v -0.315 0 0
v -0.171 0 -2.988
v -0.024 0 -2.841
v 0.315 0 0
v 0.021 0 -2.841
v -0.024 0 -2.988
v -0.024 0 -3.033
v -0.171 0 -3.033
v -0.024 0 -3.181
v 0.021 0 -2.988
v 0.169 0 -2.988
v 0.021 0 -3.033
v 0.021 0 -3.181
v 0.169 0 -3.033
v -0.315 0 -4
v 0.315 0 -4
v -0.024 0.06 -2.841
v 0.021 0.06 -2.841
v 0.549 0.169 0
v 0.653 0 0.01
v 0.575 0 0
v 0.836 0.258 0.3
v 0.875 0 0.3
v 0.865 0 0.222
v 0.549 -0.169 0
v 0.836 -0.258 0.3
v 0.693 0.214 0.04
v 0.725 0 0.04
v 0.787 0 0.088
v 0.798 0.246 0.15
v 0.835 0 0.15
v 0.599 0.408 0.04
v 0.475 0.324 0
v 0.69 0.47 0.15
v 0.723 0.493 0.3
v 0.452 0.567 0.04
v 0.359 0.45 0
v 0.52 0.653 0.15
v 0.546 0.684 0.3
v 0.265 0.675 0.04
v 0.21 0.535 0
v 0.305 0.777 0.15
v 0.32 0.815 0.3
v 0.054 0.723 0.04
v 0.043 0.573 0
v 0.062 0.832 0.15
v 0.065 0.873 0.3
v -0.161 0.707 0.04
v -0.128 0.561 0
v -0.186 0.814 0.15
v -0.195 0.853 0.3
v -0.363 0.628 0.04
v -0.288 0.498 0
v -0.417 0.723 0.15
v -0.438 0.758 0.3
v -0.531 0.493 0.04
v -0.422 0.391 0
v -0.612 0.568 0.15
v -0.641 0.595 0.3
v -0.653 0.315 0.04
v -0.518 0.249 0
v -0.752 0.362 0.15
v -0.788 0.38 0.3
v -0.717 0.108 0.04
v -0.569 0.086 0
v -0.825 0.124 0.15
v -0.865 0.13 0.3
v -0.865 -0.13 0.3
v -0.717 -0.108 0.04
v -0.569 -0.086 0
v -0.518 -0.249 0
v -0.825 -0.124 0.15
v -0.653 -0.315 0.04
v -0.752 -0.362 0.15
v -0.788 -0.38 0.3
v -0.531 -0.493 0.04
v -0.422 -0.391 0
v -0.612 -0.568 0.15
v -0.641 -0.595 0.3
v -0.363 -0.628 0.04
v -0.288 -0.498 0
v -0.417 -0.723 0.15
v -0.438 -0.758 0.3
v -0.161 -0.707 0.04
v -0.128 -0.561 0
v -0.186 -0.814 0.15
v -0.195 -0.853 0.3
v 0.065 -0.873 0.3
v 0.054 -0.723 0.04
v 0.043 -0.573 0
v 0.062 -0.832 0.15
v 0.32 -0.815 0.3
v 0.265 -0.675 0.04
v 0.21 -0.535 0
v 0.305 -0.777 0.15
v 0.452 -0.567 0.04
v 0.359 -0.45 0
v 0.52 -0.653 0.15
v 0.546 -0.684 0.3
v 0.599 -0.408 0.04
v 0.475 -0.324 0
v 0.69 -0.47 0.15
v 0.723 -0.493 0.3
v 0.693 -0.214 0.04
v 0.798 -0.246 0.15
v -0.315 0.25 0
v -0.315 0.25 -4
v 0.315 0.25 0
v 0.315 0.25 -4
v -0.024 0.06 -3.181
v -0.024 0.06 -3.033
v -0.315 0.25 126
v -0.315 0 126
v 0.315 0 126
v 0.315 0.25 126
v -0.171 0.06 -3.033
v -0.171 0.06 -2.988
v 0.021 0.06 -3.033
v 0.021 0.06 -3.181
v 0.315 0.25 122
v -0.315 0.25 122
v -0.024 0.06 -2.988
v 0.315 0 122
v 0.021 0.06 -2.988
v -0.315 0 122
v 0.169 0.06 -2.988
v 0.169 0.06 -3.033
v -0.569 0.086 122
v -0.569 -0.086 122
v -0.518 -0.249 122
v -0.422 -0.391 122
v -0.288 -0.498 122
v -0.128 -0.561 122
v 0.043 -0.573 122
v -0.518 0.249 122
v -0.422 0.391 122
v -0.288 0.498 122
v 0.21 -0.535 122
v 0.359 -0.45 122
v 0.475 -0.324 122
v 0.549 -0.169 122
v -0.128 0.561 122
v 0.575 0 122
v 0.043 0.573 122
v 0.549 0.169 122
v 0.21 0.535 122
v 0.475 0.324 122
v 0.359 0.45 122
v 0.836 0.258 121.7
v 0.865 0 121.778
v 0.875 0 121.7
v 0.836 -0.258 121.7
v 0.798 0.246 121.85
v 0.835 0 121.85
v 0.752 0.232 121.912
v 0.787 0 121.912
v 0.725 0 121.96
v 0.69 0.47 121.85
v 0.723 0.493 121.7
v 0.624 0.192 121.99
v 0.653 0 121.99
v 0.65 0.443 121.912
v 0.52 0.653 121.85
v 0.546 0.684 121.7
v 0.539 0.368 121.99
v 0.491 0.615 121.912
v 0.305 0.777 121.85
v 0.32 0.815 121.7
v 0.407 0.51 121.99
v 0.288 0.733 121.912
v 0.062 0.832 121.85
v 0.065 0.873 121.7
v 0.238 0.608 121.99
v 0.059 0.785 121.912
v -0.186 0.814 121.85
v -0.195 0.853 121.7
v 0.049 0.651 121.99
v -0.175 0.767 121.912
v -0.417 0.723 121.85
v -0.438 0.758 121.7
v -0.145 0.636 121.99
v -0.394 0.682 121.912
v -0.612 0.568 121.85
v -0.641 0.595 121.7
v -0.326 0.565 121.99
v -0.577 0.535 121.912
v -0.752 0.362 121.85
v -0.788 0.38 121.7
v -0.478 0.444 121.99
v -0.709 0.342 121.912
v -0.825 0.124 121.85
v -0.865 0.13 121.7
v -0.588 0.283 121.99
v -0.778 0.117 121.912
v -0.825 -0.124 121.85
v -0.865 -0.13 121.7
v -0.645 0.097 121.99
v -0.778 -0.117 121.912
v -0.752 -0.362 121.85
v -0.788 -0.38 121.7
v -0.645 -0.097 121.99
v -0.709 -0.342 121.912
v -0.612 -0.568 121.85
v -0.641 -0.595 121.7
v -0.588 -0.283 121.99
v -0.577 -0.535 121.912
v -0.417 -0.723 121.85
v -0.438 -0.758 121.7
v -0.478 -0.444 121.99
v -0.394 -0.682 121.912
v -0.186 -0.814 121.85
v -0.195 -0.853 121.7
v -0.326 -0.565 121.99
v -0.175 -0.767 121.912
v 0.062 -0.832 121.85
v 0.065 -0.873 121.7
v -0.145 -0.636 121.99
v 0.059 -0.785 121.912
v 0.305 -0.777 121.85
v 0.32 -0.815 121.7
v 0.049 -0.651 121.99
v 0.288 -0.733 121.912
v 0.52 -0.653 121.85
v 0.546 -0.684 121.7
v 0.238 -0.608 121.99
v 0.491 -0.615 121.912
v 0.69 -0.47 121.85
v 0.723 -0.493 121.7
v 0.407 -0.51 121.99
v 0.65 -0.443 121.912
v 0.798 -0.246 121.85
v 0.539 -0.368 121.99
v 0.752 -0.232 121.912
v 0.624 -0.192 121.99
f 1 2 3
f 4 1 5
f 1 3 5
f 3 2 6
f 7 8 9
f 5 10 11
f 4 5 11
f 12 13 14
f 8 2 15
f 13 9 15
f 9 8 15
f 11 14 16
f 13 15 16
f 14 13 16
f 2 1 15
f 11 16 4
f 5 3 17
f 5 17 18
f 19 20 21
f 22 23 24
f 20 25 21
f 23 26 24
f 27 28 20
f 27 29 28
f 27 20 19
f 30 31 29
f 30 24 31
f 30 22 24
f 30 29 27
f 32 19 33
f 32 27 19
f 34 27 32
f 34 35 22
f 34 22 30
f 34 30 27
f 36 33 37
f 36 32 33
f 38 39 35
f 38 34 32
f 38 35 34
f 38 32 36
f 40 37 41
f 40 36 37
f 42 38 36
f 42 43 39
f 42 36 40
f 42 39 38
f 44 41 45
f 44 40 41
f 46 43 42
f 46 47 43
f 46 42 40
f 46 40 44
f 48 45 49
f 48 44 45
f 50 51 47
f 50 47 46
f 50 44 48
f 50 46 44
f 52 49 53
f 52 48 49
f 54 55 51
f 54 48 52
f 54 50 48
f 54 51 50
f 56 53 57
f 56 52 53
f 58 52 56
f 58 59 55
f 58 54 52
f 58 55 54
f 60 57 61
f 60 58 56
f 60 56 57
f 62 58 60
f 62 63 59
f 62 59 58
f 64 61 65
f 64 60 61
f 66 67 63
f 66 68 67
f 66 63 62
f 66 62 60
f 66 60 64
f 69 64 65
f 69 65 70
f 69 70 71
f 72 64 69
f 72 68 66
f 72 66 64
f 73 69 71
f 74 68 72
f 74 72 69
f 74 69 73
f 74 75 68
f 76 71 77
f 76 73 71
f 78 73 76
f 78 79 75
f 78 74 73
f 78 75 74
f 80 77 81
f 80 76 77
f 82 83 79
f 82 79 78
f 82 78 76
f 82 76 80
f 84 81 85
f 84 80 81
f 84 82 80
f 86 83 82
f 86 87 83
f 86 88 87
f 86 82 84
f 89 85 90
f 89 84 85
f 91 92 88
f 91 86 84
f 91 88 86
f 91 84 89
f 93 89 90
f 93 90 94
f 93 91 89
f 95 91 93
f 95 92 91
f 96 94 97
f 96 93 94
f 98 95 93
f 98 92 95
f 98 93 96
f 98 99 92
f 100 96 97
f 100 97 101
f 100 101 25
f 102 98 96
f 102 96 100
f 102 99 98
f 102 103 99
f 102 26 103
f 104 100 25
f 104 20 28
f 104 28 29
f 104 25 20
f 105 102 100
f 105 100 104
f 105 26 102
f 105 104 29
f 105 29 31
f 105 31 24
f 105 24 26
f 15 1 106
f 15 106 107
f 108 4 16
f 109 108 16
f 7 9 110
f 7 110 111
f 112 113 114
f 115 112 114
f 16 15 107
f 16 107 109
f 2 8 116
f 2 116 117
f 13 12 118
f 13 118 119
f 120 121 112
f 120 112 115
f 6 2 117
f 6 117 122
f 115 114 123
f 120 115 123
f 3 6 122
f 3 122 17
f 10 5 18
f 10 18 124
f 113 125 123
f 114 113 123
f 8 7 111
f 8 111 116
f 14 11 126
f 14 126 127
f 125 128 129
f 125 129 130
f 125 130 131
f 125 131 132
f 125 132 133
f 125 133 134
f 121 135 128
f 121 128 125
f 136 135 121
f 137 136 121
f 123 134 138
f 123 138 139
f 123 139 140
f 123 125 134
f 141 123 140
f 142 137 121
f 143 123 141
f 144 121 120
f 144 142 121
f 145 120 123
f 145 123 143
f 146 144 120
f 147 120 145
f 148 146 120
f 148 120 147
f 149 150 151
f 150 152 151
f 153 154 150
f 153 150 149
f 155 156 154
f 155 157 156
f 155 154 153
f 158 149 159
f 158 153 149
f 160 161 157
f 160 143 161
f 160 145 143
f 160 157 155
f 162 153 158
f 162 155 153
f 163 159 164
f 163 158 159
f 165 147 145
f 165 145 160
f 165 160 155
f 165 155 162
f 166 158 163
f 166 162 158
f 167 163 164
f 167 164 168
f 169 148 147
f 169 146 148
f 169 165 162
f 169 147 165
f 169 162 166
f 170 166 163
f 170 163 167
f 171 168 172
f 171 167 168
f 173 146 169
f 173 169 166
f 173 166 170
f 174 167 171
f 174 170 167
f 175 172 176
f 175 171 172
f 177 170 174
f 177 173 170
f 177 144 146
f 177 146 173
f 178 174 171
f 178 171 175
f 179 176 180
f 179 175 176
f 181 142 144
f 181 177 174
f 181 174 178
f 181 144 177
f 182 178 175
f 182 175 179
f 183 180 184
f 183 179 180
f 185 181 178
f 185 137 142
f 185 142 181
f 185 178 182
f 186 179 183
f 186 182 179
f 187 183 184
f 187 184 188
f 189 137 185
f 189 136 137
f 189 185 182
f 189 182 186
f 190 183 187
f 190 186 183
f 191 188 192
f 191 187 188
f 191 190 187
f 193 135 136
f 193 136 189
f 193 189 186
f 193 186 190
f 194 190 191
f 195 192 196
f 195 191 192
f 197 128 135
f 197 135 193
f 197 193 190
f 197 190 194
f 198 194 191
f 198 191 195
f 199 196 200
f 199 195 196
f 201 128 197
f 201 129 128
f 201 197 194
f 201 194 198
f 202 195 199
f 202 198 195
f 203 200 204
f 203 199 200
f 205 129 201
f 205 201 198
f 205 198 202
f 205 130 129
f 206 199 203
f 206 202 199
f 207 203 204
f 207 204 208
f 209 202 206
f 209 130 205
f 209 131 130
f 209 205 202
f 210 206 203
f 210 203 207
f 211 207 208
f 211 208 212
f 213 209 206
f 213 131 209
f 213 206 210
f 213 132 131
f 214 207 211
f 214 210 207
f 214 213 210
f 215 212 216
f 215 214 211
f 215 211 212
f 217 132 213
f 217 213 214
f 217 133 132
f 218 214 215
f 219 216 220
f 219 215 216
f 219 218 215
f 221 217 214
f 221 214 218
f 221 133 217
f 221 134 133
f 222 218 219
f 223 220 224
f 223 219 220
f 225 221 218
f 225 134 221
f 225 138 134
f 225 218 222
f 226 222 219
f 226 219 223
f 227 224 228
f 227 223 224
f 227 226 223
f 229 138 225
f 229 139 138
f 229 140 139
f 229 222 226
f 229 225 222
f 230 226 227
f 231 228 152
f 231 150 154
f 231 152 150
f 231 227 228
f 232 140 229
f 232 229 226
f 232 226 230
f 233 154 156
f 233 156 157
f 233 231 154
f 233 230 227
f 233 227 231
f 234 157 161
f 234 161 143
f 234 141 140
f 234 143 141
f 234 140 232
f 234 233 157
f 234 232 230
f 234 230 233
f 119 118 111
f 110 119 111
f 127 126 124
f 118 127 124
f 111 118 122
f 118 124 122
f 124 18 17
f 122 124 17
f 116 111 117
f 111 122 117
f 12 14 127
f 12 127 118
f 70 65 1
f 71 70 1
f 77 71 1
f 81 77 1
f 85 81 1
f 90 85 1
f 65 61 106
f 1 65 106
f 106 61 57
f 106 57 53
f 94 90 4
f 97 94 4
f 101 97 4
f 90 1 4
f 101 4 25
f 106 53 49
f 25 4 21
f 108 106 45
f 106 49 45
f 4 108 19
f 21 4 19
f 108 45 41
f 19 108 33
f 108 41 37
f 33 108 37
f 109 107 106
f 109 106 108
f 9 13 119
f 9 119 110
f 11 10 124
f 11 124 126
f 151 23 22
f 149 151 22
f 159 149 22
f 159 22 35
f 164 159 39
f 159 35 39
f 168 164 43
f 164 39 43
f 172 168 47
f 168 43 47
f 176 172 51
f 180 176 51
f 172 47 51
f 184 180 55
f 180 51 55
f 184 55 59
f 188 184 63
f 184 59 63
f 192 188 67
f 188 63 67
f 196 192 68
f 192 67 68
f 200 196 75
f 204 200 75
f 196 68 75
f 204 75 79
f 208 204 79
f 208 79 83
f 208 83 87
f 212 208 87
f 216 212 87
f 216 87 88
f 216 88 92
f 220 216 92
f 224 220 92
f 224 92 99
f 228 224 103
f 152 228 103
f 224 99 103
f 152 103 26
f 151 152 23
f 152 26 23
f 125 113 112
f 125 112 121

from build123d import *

# Parameters (mm, degrees)
ESQUISSE1_R             = 0.875
BOSS_EXTRU_1_DEPTH      = 122
ESQUISSE2_W             = 0.62970299
ESQUISSE2_H             = 8
BOSS_EXTRU_2_DEPTH      = 0.25
CONG_1_R                = 0.3
ENL_V_MAT_EXTRU_1_DEPTH = 0.06


with BuildPart() as part:
    # Esquisse1 → Boss.-Extru.1 (new body)
    with BuildSketch(Plane.XY):
        Circle(ESQUISSE1_R)
    extrude(amount=BOSS_EXTRU_1_DEPTH)

    # Esquisse2 → Boss.-Extru.2 (add)
    with BuildSketch(Plane(origin=(0, 0, 0), x_dir=(1, 0, 0), z_dir=(0, 1, 0))):
        Rectangle(ESQUISSE2_W, ESQUISSE2_H)
        with Locations((0, -122)):
            Rectangle(ESQUISSE2_W, ESQUISSE2_H)
    extrude(amount=BOSS_EXTRU_2_DEPTH)

    # Congé1
    cong_1_edges = [part.edges().sort_by_distance(p)[0] for p in [
        (-0.875, 0, 0),
        (-0.875, 0, 122),
    ]]
    fillet(cong_1_edges, radius=CONG_1_R)

    # Esquisse3 → Enlèv. mat.-Extru.1 (cut)
    with BuildSketch(Plane.XZ):
        Polygon((-0.023732379, -2.988428768), (-0.023732379, -2.840992871), (0.021139416, -2.840992871), (0.021139416, -2.988428768), (0.168575313, -2.988428768), (0.168575313, -3.033300563), (0.021139416, -3.033300563), (0.021139416, -3.18073646), (-0.023732379, -3.18073646), (-0.023732379, -3.033300563), (-0.171168277, -3.033300563), (-0.171168277, -2.988428768), align=None)
    extrude(amount=-ENL_V_MAT_EXTRU_1_DEPTH, mode=Mode.SUBTRACT)


solid = part.part
